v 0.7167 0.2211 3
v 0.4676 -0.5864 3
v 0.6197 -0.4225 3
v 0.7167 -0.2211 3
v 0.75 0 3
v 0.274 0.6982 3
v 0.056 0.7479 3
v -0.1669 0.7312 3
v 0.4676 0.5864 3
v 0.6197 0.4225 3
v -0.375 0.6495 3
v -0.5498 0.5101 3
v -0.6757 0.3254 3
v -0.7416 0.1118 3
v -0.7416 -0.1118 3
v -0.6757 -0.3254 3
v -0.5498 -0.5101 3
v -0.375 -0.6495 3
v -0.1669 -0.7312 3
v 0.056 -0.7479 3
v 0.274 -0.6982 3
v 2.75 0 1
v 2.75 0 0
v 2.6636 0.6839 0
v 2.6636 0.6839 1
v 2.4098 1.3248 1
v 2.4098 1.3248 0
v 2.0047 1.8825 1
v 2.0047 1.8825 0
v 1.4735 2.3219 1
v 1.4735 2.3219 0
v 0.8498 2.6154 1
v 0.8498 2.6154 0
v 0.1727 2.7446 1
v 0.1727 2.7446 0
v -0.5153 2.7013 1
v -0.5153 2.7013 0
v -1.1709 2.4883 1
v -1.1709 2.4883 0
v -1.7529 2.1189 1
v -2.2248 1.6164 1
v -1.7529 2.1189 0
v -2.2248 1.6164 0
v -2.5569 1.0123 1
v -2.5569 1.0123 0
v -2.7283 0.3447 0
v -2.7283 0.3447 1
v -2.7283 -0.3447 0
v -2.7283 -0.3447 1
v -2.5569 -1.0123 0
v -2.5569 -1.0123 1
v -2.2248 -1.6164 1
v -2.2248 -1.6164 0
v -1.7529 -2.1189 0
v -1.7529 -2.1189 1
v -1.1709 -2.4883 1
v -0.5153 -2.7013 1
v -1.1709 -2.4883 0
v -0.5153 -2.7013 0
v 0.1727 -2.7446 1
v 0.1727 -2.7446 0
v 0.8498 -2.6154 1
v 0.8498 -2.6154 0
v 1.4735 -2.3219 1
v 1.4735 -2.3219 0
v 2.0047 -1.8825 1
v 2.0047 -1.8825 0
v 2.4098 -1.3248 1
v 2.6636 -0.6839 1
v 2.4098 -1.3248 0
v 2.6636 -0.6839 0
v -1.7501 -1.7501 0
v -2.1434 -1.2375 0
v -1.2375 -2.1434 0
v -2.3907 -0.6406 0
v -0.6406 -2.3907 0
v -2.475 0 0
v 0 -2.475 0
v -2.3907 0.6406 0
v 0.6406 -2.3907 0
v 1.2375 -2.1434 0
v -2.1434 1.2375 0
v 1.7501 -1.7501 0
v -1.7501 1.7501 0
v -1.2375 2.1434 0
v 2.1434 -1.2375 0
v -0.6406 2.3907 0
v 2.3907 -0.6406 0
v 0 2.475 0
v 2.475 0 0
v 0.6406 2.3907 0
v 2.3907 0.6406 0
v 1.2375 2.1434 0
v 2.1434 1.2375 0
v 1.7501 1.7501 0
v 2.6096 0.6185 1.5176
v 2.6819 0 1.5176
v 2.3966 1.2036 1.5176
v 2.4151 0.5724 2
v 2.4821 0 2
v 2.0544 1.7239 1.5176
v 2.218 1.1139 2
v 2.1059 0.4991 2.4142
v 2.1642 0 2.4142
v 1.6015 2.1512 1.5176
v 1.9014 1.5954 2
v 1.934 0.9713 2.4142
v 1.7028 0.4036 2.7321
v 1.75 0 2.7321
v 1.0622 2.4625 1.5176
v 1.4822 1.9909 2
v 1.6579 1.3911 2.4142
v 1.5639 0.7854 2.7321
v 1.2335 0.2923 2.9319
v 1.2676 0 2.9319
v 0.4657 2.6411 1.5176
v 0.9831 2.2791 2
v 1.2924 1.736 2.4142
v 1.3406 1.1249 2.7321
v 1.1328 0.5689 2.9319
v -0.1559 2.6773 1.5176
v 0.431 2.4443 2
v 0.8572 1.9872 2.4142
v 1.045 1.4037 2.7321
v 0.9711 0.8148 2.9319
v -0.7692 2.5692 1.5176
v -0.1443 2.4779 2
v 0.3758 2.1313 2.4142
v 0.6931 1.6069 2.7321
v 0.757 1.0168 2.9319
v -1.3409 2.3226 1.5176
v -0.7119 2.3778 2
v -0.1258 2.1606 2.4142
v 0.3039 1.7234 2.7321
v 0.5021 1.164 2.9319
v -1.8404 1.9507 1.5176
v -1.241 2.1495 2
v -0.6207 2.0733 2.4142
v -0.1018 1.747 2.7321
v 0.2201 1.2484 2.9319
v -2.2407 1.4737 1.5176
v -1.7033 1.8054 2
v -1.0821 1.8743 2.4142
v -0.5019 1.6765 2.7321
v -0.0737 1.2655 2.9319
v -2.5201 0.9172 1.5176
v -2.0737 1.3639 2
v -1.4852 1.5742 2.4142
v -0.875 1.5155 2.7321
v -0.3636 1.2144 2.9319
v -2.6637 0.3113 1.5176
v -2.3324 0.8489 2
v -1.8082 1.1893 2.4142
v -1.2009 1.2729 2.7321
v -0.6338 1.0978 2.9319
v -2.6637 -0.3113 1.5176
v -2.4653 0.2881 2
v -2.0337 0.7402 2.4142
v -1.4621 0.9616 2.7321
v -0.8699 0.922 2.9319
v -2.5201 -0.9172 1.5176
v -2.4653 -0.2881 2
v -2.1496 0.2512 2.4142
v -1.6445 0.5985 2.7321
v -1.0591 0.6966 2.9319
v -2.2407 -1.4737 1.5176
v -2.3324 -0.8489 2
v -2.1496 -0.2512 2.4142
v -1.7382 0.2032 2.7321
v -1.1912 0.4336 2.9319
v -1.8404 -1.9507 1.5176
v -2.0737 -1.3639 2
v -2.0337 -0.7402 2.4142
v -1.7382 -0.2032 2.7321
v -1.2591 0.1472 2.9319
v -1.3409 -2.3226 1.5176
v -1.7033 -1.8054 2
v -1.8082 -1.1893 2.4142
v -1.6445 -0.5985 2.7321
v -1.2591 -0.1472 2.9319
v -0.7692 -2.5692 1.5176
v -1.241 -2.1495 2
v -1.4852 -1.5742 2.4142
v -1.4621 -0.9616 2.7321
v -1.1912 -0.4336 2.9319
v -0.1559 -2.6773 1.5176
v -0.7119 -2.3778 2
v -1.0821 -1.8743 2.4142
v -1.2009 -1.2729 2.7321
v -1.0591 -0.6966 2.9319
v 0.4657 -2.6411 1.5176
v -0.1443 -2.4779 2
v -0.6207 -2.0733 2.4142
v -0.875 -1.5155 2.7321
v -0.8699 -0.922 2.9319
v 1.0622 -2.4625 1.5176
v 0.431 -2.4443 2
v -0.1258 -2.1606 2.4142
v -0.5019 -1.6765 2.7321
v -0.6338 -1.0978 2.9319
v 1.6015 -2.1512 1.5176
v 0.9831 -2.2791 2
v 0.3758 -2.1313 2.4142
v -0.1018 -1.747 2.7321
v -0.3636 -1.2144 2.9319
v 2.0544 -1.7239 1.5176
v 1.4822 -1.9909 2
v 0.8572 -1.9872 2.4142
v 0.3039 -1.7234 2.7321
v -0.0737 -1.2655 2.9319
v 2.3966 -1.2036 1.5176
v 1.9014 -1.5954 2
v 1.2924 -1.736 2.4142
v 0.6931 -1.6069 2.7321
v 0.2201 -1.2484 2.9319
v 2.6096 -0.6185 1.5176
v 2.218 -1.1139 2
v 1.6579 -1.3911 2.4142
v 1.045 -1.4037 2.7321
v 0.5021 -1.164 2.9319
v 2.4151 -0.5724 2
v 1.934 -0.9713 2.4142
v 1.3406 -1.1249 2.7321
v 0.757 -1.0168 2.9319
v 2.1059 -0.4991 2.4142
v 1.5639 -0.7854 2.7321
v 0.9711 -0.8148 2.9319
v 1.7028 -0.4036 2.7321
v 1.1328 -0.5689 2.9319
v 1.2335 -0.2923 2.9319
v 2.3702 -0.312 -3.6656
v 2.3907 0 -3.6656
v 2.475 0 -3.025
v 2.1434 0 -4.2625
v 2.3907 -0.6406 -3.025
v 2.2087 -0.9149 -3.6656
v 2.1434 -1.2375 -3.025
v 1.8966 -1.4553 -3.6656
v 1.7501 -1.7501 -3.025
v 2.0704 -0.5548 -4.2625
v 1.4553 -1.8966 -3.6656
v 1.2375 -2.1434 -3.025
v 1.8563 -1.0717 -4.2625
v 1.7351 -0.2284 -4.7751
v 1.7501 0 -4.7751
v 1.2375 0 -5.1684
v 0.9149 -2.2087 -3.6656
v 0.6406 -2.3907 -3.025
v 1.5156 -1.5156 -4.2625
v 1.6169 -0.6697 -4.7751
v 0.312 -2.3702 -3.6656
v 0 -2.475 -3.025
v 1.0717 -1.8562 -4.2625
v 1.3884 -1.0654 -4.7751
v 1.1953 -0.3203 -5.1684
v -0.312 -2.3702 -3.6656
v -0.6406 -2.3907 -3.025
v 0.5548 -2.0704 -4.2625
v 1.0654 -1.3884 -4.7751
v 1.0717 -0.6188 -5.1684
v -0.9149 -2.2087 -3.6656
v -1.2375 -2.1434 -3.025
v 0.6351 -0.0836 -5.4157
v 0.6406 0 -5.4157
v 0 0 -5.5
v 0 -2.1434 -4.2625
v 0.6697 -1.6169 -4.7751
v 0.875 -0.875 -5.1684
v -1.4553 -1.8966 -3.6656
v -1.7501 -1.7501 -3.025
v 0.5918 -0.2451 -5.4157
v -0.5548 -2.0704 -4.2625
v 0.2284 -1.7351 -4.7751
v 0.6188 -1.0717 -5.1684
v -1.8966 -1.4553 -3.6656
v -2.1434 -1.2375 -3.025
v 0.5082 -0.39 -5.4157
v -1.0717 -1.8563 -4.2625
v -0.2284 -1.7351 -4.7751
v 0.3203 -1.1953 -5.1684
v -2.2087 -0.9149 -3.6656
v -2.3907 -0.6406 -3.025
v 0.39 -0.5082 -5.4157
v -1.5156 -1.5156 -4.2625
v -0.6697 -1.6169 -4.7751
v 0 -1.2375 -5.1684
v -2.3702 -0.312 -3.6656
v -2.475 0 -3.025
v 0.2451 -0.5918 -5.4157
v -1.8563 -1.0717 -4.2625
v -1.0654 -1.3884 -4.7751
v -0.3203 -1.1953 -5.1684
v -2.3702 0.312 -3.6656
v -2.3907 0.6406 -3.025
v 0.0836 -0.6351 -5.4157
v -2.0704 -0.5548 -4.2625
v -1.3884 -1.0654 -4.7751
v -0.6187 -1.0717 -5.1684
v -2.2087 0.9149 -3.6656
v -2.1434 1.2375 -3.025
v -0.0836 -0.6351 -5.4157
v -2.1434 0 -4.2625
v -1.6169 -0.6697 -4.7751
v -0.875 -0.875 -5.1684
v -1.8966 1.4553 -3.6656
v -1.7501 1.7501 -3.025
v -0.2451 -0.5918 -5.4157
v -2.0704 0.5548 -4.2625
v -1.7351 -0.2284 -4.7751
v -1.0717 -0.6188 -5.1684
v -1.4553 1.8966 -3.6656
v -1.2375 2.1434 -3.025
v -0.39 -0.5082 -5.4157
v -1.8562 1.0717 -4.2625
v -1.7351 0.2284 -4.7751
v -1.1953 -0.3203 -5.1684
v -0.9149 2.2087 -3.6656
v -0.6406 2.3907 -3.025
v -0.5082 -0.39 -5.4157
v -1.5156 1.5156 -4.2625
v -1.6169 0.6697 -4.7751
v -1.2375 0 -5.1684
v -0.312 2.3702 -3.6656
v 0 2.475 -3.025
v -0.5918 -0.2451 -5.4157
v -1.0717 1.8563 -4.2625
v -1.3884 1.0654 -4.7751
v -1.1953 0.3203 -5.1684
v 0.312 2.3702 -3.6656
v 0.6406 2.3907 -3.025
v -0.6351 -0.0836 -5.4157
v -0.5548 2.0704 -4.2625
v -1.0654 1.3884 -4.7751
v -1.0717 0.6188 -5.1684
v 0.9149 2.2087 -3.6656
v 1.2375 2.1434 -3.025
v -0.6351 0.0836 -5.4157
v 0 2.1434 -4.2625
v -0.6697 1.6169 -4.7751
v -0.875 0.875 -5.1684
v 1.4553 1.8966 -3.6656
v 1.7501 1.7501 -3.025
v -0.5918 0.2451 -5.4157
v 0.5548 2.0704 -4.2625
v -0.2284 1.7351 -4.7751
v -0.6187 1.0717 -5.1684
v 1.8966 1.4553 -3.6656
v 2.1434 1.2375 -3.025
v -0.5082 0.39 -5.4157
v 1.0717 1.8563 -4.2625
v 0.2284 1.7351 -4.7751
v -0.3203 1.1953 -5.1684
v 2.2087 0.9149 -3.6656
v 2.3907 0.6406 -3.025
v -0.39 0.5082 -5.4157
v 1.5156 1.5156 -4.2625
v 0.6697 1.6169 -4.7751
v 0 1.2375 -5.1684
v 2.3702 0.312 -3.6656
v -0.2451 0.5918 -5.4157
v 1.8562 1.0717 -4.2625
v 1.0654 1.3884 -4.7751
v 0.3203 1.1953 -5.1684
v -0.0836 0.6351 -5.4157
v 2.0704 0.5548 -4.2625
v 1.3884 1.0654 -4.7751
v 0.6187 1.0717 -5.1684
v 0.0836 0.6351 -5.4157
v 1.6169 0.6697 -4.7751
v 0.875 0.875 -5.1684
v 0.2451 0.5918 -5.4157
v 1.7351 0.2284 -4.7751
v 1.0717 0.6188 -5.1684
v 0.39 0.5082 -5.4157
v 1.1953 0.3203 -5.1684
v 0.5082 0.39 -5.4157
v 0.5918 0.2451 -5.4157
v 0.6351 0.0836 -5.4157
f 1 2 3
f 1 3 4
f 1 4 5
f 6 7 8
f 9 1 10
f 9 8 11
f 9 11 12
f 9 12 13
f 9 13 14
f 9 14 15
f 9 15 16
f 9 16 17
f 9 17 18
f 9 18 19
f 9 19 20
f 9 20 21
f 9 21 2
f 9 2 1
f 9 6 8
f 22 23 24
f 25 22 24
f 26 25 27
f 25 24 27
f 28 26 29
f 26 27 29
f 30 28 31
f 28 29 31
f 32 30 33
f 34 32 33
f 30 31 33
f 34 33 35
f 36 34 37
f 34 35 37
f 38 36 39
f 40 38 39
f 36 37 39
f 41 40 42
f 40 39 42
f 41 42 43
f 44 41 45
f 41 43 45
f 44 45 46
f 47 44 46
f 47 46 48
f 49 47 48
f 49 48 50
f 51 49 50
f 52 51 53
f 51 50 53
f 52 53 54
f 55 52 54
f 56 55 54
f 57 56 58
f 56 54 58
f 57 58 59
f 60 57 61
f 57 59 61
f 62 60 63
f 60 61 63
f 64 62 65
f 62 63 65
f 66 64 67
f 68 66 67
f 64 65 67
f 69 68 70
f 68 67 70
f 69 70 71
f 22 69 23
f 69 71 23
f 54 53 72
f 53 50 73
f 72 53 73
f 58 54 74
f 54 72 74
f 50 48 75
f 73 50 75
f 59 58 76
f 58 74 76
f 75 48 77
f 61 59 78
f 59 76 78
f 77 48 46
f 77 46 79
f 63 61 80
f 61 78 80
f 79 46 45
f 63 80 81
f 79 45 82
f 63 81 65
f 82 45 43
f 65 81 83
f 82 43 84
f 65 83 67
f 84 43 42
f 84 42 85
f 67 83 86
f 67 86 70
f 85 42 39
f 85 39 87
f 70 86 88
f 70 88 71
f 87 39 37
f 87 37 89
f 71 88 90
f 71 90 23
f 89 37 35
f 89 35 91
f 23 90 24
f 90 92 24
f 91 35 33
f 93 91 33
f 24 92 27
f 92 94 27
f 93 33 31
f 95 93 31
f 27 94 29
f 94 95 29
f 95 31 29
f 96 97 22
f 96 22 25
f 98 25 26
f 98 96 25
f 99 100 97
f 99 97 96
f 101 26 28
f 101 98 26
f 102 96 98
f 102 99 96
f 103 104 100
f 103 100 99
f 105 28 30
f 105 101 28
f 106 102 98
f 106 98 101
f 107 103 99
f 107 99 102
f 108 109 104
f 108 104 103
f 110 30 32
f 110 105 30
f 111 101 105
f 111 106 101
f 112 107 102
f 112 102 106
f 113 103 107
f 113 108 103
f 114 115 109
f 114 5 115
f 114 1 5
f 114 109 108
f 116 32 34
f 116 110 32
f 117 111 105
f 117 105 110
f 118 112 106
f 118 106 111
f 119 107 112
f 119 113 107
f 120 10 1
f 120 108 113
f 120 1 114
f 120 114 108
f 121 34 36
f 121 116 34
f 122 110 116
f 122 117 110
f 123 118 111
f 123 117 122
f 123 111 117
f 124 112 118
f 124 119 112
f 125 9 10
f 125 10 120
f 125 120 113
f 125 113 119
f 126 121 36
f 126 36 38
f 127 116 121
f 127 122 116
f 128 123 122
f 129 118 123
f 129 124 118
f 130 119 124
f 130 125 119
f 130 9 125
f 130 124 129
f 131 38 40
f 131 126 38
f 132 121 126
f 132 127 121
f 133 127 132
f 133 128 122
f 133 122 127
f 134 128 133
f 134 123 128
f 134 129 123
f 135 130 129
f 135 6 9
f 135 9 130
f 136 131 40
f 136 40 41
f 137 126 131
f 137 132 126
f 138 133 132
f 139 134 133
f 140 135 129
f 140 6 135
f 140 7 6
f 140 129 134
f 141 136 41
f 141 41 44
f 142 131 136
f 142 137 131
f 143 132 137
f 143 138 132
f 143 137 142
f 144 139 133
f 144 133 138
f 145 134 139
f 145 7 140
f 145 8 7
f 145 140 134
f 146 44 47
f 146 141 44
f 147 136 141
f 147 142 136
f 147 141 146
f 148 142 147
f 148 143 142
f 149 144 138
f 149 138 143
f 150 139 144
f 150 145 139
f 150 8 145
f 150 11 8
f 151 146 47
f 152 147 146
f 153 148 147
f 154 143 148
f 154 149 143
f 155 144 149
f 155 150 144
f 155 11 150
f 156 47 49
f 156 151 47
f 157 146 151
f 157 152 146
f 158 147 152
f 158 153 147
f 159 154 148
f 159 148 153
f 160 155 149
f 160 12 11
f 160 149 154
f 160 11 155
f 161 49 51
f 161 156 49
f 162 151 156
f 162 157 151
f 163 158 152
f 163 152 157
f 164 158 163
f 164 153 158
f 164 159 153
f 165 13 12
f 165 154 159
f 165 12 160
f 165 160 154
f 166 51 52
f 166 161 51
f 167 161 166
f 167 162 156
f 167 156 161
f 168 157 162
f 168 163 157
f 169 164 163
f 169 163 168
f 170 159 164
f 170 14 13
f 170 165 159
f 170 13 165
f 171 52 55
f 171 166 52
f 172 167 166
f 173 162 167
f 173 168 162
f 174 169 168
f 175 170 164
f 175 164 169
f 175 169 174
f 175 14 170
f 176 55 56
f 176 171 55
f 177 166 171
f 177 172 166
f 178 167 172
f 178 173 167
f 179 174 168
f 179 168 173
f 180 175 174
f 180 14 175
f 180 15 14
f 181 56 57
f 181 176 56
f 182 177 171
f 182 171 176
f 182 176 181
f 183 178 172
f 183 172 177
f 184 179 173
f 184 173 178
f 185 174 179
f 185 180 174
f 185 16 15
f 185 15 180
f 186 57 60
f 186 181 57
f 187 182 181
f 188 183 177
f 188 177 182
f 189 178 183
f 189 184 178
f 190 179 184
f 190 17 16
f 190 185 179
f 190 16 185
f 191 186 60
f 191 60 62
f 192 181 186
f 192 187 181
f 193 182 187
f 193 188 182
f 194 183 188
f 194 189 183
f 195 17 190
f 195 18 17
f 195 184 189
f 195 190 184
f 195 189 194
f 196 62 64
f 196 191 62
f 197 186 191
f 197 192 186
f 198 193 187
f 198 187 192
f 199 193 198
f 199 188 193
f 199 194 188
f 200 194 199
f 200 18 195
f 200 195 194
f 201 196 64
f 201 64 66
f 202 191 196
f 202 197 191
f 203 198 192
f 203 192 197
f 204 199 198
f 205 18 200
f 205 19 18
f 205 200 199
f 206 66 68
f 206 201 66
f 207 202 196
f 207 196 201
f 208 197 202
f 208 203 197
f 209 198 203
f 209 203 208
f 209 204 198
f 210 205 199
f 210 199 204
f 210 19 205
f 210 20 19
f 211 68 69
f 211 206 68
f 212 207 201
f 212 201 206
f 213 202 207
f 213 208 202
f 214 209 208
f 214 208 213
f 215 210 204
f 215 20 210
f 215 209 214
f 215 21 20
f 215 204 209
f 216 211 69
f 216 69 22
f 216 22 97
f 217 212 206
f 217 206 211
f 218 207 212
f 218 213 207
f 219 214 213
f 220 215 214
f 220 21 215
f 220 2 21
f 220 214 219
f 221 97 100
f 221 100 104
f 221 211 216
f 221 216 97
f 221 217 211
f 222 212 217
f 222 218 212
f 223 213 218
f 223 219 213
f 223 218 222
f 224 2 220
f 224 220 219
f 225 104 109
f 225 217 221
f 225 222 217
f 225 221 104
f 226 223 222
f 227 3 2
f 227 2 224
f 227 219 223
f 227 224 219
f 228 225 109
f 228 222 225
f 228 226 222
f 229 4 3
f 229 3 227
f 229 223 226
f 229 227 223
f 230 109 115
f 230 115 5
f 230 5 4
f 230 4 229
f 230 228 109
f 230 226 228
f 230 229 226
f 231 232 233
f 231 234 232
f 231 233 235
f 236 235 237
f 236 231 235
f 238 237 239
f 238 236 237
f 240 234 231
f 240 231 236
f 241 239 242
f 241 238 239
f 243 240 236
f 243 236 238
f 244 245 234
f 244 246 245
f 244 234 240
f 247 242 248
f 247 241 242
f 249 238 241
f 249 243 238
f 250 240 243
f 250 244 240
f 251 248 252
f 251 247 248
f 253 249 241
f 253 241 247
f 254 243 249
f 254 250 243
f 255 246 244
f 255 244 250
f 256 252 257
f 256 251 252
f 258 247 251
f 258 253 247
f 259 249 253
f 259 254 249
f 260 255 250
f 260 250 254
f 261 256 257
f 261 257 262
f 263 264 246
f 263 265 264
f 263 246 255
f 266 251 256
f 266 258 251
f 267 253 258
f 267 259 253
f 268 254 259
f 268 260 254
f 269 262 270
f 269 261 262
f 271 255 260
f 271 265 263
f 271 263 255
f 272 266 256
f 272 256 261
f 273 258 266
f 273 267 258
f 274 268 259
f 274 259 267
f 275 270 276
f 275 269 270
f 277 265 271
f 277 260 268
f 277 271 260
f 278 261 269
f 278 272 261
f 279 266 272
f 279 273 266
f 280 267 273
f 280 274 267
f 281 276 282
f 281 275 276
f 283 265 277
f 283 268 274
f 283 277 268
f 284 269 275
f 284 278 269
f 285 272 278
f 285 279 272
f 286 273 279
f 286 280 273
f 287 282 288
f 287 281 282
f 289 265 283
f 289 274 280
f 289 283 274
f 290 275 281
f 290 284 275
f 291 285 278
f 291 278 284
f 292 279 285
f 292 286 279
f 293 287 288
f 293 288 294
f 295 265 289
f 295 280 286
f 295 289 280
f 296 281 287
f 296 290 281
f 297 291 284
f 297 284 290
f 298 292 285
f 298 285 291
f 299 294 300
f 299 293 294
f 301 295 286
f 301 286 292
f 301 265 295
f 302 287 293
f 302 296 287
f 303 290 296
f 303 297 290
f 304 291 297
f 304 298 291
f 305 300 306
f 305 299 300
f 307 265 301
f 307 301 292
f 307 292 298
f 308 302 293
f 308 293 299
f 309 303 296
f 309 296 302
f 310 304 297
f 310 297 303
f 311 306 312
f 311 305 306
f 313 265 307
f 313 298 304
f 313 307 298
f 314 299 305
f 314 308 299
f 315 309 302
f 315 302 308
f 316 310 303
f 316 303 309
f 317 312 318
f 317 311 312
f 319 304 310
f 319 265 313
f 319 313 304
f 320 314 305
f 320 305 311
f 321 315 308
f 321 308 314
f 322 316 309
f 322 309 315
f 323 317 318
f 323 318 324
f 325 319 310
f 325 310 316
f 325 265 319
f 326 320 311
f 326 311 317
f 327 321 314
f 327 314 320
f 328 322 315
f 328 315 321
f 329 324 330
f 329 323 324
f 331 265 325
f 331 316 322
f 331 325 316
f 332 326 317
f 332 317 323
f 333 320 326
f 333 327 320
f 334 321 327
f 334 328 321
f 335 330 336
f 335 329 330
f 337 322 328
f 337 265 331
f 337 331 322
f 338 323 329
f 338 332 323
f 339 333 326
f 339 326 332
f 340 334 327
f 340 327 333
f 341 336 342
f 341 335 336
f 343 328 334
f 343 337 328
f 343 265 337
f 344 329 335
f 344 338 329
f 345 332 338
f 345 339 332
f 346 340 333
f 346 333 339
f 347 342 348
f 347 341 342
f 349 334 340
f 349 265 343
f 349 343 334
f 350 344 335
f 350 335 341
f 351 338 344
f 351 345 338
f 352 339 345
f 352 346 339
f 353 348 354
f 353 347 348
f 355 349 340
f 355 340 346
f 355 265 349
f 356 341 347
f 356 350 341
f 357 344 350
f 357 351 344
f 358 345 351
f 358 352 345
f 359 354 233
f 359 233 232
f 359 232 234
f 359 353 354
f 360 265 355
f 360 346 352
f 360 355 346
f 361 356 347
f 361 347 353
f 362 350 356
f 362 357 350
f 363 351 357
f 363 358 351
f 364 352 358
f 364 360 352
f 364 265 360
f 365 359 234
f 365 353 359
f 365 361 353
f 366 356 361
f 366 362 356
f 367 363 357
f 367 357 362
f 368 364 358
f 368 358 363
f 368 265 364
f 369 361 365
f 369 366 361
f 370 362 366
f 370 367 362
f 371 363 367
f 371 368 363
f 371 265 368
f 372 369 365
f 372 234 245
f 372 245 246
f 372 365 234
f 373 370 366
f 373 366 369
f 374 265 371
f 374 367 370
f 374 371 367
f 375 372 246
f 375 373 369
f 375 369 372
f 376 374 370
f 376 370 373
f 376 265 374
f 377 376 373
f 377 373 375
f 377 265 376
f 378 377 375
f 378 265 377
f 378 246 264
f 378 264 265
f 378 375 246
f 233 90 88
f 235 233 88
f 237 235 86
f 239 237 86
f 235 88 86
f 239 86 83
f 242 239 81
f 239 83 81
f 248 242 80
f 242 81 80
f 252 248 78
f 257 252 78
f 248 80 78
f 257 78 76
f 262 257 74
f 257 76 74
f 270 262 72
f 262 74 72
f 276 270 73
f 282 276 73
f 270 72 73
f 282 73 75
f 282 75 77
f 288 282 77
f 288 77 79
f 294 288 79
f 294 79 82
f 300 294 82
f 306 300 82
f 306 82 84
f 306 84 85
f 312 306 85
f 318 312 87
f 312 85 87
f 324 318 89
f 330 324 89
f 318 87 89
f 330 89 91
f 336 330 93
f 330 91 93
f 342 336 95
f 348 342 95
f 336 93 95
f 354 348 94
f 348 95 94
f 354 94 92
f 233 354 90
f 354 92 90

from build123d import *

# Parameters (mm, degrees)
F0_R     = 2.75
F1_DEPTH = 3
F2_R     = 2
F3_R     = 2.475
F4_DEPTH = 5.5
F5_R     = 2.475


with BuildPart() as f1:
    # F0 (on Top) → F1 (new body)
    with BuildSketch(Plane.XY):
        Circle(F0_R)
    extrude(amount=F1_DEPTH)

    # F2
    f2_edges = [f1.edges().sort_by_distance(p)[0] for p in [
        (-2.75, 0, 3),
    ]]
    fillet(f2_edges, radius=F2_R)

    # F3 (on face) → F4 (join)
    with BuildSketch(Plane(origin=(0, 0, 0), x_dir=(1, 0, 0), z_dir=(0, 0, -1))):
        Circle(F3_R)
    extrude(amount=F4_DEPTH)

    # F5
    f5_edges = [f1.edges().sort_by_distance(p)[0] for p in [
        (-2.475, 0, -5.5),
    ]]
    fillet(f5_edges, radius=F5_R)


solid = f1.part
